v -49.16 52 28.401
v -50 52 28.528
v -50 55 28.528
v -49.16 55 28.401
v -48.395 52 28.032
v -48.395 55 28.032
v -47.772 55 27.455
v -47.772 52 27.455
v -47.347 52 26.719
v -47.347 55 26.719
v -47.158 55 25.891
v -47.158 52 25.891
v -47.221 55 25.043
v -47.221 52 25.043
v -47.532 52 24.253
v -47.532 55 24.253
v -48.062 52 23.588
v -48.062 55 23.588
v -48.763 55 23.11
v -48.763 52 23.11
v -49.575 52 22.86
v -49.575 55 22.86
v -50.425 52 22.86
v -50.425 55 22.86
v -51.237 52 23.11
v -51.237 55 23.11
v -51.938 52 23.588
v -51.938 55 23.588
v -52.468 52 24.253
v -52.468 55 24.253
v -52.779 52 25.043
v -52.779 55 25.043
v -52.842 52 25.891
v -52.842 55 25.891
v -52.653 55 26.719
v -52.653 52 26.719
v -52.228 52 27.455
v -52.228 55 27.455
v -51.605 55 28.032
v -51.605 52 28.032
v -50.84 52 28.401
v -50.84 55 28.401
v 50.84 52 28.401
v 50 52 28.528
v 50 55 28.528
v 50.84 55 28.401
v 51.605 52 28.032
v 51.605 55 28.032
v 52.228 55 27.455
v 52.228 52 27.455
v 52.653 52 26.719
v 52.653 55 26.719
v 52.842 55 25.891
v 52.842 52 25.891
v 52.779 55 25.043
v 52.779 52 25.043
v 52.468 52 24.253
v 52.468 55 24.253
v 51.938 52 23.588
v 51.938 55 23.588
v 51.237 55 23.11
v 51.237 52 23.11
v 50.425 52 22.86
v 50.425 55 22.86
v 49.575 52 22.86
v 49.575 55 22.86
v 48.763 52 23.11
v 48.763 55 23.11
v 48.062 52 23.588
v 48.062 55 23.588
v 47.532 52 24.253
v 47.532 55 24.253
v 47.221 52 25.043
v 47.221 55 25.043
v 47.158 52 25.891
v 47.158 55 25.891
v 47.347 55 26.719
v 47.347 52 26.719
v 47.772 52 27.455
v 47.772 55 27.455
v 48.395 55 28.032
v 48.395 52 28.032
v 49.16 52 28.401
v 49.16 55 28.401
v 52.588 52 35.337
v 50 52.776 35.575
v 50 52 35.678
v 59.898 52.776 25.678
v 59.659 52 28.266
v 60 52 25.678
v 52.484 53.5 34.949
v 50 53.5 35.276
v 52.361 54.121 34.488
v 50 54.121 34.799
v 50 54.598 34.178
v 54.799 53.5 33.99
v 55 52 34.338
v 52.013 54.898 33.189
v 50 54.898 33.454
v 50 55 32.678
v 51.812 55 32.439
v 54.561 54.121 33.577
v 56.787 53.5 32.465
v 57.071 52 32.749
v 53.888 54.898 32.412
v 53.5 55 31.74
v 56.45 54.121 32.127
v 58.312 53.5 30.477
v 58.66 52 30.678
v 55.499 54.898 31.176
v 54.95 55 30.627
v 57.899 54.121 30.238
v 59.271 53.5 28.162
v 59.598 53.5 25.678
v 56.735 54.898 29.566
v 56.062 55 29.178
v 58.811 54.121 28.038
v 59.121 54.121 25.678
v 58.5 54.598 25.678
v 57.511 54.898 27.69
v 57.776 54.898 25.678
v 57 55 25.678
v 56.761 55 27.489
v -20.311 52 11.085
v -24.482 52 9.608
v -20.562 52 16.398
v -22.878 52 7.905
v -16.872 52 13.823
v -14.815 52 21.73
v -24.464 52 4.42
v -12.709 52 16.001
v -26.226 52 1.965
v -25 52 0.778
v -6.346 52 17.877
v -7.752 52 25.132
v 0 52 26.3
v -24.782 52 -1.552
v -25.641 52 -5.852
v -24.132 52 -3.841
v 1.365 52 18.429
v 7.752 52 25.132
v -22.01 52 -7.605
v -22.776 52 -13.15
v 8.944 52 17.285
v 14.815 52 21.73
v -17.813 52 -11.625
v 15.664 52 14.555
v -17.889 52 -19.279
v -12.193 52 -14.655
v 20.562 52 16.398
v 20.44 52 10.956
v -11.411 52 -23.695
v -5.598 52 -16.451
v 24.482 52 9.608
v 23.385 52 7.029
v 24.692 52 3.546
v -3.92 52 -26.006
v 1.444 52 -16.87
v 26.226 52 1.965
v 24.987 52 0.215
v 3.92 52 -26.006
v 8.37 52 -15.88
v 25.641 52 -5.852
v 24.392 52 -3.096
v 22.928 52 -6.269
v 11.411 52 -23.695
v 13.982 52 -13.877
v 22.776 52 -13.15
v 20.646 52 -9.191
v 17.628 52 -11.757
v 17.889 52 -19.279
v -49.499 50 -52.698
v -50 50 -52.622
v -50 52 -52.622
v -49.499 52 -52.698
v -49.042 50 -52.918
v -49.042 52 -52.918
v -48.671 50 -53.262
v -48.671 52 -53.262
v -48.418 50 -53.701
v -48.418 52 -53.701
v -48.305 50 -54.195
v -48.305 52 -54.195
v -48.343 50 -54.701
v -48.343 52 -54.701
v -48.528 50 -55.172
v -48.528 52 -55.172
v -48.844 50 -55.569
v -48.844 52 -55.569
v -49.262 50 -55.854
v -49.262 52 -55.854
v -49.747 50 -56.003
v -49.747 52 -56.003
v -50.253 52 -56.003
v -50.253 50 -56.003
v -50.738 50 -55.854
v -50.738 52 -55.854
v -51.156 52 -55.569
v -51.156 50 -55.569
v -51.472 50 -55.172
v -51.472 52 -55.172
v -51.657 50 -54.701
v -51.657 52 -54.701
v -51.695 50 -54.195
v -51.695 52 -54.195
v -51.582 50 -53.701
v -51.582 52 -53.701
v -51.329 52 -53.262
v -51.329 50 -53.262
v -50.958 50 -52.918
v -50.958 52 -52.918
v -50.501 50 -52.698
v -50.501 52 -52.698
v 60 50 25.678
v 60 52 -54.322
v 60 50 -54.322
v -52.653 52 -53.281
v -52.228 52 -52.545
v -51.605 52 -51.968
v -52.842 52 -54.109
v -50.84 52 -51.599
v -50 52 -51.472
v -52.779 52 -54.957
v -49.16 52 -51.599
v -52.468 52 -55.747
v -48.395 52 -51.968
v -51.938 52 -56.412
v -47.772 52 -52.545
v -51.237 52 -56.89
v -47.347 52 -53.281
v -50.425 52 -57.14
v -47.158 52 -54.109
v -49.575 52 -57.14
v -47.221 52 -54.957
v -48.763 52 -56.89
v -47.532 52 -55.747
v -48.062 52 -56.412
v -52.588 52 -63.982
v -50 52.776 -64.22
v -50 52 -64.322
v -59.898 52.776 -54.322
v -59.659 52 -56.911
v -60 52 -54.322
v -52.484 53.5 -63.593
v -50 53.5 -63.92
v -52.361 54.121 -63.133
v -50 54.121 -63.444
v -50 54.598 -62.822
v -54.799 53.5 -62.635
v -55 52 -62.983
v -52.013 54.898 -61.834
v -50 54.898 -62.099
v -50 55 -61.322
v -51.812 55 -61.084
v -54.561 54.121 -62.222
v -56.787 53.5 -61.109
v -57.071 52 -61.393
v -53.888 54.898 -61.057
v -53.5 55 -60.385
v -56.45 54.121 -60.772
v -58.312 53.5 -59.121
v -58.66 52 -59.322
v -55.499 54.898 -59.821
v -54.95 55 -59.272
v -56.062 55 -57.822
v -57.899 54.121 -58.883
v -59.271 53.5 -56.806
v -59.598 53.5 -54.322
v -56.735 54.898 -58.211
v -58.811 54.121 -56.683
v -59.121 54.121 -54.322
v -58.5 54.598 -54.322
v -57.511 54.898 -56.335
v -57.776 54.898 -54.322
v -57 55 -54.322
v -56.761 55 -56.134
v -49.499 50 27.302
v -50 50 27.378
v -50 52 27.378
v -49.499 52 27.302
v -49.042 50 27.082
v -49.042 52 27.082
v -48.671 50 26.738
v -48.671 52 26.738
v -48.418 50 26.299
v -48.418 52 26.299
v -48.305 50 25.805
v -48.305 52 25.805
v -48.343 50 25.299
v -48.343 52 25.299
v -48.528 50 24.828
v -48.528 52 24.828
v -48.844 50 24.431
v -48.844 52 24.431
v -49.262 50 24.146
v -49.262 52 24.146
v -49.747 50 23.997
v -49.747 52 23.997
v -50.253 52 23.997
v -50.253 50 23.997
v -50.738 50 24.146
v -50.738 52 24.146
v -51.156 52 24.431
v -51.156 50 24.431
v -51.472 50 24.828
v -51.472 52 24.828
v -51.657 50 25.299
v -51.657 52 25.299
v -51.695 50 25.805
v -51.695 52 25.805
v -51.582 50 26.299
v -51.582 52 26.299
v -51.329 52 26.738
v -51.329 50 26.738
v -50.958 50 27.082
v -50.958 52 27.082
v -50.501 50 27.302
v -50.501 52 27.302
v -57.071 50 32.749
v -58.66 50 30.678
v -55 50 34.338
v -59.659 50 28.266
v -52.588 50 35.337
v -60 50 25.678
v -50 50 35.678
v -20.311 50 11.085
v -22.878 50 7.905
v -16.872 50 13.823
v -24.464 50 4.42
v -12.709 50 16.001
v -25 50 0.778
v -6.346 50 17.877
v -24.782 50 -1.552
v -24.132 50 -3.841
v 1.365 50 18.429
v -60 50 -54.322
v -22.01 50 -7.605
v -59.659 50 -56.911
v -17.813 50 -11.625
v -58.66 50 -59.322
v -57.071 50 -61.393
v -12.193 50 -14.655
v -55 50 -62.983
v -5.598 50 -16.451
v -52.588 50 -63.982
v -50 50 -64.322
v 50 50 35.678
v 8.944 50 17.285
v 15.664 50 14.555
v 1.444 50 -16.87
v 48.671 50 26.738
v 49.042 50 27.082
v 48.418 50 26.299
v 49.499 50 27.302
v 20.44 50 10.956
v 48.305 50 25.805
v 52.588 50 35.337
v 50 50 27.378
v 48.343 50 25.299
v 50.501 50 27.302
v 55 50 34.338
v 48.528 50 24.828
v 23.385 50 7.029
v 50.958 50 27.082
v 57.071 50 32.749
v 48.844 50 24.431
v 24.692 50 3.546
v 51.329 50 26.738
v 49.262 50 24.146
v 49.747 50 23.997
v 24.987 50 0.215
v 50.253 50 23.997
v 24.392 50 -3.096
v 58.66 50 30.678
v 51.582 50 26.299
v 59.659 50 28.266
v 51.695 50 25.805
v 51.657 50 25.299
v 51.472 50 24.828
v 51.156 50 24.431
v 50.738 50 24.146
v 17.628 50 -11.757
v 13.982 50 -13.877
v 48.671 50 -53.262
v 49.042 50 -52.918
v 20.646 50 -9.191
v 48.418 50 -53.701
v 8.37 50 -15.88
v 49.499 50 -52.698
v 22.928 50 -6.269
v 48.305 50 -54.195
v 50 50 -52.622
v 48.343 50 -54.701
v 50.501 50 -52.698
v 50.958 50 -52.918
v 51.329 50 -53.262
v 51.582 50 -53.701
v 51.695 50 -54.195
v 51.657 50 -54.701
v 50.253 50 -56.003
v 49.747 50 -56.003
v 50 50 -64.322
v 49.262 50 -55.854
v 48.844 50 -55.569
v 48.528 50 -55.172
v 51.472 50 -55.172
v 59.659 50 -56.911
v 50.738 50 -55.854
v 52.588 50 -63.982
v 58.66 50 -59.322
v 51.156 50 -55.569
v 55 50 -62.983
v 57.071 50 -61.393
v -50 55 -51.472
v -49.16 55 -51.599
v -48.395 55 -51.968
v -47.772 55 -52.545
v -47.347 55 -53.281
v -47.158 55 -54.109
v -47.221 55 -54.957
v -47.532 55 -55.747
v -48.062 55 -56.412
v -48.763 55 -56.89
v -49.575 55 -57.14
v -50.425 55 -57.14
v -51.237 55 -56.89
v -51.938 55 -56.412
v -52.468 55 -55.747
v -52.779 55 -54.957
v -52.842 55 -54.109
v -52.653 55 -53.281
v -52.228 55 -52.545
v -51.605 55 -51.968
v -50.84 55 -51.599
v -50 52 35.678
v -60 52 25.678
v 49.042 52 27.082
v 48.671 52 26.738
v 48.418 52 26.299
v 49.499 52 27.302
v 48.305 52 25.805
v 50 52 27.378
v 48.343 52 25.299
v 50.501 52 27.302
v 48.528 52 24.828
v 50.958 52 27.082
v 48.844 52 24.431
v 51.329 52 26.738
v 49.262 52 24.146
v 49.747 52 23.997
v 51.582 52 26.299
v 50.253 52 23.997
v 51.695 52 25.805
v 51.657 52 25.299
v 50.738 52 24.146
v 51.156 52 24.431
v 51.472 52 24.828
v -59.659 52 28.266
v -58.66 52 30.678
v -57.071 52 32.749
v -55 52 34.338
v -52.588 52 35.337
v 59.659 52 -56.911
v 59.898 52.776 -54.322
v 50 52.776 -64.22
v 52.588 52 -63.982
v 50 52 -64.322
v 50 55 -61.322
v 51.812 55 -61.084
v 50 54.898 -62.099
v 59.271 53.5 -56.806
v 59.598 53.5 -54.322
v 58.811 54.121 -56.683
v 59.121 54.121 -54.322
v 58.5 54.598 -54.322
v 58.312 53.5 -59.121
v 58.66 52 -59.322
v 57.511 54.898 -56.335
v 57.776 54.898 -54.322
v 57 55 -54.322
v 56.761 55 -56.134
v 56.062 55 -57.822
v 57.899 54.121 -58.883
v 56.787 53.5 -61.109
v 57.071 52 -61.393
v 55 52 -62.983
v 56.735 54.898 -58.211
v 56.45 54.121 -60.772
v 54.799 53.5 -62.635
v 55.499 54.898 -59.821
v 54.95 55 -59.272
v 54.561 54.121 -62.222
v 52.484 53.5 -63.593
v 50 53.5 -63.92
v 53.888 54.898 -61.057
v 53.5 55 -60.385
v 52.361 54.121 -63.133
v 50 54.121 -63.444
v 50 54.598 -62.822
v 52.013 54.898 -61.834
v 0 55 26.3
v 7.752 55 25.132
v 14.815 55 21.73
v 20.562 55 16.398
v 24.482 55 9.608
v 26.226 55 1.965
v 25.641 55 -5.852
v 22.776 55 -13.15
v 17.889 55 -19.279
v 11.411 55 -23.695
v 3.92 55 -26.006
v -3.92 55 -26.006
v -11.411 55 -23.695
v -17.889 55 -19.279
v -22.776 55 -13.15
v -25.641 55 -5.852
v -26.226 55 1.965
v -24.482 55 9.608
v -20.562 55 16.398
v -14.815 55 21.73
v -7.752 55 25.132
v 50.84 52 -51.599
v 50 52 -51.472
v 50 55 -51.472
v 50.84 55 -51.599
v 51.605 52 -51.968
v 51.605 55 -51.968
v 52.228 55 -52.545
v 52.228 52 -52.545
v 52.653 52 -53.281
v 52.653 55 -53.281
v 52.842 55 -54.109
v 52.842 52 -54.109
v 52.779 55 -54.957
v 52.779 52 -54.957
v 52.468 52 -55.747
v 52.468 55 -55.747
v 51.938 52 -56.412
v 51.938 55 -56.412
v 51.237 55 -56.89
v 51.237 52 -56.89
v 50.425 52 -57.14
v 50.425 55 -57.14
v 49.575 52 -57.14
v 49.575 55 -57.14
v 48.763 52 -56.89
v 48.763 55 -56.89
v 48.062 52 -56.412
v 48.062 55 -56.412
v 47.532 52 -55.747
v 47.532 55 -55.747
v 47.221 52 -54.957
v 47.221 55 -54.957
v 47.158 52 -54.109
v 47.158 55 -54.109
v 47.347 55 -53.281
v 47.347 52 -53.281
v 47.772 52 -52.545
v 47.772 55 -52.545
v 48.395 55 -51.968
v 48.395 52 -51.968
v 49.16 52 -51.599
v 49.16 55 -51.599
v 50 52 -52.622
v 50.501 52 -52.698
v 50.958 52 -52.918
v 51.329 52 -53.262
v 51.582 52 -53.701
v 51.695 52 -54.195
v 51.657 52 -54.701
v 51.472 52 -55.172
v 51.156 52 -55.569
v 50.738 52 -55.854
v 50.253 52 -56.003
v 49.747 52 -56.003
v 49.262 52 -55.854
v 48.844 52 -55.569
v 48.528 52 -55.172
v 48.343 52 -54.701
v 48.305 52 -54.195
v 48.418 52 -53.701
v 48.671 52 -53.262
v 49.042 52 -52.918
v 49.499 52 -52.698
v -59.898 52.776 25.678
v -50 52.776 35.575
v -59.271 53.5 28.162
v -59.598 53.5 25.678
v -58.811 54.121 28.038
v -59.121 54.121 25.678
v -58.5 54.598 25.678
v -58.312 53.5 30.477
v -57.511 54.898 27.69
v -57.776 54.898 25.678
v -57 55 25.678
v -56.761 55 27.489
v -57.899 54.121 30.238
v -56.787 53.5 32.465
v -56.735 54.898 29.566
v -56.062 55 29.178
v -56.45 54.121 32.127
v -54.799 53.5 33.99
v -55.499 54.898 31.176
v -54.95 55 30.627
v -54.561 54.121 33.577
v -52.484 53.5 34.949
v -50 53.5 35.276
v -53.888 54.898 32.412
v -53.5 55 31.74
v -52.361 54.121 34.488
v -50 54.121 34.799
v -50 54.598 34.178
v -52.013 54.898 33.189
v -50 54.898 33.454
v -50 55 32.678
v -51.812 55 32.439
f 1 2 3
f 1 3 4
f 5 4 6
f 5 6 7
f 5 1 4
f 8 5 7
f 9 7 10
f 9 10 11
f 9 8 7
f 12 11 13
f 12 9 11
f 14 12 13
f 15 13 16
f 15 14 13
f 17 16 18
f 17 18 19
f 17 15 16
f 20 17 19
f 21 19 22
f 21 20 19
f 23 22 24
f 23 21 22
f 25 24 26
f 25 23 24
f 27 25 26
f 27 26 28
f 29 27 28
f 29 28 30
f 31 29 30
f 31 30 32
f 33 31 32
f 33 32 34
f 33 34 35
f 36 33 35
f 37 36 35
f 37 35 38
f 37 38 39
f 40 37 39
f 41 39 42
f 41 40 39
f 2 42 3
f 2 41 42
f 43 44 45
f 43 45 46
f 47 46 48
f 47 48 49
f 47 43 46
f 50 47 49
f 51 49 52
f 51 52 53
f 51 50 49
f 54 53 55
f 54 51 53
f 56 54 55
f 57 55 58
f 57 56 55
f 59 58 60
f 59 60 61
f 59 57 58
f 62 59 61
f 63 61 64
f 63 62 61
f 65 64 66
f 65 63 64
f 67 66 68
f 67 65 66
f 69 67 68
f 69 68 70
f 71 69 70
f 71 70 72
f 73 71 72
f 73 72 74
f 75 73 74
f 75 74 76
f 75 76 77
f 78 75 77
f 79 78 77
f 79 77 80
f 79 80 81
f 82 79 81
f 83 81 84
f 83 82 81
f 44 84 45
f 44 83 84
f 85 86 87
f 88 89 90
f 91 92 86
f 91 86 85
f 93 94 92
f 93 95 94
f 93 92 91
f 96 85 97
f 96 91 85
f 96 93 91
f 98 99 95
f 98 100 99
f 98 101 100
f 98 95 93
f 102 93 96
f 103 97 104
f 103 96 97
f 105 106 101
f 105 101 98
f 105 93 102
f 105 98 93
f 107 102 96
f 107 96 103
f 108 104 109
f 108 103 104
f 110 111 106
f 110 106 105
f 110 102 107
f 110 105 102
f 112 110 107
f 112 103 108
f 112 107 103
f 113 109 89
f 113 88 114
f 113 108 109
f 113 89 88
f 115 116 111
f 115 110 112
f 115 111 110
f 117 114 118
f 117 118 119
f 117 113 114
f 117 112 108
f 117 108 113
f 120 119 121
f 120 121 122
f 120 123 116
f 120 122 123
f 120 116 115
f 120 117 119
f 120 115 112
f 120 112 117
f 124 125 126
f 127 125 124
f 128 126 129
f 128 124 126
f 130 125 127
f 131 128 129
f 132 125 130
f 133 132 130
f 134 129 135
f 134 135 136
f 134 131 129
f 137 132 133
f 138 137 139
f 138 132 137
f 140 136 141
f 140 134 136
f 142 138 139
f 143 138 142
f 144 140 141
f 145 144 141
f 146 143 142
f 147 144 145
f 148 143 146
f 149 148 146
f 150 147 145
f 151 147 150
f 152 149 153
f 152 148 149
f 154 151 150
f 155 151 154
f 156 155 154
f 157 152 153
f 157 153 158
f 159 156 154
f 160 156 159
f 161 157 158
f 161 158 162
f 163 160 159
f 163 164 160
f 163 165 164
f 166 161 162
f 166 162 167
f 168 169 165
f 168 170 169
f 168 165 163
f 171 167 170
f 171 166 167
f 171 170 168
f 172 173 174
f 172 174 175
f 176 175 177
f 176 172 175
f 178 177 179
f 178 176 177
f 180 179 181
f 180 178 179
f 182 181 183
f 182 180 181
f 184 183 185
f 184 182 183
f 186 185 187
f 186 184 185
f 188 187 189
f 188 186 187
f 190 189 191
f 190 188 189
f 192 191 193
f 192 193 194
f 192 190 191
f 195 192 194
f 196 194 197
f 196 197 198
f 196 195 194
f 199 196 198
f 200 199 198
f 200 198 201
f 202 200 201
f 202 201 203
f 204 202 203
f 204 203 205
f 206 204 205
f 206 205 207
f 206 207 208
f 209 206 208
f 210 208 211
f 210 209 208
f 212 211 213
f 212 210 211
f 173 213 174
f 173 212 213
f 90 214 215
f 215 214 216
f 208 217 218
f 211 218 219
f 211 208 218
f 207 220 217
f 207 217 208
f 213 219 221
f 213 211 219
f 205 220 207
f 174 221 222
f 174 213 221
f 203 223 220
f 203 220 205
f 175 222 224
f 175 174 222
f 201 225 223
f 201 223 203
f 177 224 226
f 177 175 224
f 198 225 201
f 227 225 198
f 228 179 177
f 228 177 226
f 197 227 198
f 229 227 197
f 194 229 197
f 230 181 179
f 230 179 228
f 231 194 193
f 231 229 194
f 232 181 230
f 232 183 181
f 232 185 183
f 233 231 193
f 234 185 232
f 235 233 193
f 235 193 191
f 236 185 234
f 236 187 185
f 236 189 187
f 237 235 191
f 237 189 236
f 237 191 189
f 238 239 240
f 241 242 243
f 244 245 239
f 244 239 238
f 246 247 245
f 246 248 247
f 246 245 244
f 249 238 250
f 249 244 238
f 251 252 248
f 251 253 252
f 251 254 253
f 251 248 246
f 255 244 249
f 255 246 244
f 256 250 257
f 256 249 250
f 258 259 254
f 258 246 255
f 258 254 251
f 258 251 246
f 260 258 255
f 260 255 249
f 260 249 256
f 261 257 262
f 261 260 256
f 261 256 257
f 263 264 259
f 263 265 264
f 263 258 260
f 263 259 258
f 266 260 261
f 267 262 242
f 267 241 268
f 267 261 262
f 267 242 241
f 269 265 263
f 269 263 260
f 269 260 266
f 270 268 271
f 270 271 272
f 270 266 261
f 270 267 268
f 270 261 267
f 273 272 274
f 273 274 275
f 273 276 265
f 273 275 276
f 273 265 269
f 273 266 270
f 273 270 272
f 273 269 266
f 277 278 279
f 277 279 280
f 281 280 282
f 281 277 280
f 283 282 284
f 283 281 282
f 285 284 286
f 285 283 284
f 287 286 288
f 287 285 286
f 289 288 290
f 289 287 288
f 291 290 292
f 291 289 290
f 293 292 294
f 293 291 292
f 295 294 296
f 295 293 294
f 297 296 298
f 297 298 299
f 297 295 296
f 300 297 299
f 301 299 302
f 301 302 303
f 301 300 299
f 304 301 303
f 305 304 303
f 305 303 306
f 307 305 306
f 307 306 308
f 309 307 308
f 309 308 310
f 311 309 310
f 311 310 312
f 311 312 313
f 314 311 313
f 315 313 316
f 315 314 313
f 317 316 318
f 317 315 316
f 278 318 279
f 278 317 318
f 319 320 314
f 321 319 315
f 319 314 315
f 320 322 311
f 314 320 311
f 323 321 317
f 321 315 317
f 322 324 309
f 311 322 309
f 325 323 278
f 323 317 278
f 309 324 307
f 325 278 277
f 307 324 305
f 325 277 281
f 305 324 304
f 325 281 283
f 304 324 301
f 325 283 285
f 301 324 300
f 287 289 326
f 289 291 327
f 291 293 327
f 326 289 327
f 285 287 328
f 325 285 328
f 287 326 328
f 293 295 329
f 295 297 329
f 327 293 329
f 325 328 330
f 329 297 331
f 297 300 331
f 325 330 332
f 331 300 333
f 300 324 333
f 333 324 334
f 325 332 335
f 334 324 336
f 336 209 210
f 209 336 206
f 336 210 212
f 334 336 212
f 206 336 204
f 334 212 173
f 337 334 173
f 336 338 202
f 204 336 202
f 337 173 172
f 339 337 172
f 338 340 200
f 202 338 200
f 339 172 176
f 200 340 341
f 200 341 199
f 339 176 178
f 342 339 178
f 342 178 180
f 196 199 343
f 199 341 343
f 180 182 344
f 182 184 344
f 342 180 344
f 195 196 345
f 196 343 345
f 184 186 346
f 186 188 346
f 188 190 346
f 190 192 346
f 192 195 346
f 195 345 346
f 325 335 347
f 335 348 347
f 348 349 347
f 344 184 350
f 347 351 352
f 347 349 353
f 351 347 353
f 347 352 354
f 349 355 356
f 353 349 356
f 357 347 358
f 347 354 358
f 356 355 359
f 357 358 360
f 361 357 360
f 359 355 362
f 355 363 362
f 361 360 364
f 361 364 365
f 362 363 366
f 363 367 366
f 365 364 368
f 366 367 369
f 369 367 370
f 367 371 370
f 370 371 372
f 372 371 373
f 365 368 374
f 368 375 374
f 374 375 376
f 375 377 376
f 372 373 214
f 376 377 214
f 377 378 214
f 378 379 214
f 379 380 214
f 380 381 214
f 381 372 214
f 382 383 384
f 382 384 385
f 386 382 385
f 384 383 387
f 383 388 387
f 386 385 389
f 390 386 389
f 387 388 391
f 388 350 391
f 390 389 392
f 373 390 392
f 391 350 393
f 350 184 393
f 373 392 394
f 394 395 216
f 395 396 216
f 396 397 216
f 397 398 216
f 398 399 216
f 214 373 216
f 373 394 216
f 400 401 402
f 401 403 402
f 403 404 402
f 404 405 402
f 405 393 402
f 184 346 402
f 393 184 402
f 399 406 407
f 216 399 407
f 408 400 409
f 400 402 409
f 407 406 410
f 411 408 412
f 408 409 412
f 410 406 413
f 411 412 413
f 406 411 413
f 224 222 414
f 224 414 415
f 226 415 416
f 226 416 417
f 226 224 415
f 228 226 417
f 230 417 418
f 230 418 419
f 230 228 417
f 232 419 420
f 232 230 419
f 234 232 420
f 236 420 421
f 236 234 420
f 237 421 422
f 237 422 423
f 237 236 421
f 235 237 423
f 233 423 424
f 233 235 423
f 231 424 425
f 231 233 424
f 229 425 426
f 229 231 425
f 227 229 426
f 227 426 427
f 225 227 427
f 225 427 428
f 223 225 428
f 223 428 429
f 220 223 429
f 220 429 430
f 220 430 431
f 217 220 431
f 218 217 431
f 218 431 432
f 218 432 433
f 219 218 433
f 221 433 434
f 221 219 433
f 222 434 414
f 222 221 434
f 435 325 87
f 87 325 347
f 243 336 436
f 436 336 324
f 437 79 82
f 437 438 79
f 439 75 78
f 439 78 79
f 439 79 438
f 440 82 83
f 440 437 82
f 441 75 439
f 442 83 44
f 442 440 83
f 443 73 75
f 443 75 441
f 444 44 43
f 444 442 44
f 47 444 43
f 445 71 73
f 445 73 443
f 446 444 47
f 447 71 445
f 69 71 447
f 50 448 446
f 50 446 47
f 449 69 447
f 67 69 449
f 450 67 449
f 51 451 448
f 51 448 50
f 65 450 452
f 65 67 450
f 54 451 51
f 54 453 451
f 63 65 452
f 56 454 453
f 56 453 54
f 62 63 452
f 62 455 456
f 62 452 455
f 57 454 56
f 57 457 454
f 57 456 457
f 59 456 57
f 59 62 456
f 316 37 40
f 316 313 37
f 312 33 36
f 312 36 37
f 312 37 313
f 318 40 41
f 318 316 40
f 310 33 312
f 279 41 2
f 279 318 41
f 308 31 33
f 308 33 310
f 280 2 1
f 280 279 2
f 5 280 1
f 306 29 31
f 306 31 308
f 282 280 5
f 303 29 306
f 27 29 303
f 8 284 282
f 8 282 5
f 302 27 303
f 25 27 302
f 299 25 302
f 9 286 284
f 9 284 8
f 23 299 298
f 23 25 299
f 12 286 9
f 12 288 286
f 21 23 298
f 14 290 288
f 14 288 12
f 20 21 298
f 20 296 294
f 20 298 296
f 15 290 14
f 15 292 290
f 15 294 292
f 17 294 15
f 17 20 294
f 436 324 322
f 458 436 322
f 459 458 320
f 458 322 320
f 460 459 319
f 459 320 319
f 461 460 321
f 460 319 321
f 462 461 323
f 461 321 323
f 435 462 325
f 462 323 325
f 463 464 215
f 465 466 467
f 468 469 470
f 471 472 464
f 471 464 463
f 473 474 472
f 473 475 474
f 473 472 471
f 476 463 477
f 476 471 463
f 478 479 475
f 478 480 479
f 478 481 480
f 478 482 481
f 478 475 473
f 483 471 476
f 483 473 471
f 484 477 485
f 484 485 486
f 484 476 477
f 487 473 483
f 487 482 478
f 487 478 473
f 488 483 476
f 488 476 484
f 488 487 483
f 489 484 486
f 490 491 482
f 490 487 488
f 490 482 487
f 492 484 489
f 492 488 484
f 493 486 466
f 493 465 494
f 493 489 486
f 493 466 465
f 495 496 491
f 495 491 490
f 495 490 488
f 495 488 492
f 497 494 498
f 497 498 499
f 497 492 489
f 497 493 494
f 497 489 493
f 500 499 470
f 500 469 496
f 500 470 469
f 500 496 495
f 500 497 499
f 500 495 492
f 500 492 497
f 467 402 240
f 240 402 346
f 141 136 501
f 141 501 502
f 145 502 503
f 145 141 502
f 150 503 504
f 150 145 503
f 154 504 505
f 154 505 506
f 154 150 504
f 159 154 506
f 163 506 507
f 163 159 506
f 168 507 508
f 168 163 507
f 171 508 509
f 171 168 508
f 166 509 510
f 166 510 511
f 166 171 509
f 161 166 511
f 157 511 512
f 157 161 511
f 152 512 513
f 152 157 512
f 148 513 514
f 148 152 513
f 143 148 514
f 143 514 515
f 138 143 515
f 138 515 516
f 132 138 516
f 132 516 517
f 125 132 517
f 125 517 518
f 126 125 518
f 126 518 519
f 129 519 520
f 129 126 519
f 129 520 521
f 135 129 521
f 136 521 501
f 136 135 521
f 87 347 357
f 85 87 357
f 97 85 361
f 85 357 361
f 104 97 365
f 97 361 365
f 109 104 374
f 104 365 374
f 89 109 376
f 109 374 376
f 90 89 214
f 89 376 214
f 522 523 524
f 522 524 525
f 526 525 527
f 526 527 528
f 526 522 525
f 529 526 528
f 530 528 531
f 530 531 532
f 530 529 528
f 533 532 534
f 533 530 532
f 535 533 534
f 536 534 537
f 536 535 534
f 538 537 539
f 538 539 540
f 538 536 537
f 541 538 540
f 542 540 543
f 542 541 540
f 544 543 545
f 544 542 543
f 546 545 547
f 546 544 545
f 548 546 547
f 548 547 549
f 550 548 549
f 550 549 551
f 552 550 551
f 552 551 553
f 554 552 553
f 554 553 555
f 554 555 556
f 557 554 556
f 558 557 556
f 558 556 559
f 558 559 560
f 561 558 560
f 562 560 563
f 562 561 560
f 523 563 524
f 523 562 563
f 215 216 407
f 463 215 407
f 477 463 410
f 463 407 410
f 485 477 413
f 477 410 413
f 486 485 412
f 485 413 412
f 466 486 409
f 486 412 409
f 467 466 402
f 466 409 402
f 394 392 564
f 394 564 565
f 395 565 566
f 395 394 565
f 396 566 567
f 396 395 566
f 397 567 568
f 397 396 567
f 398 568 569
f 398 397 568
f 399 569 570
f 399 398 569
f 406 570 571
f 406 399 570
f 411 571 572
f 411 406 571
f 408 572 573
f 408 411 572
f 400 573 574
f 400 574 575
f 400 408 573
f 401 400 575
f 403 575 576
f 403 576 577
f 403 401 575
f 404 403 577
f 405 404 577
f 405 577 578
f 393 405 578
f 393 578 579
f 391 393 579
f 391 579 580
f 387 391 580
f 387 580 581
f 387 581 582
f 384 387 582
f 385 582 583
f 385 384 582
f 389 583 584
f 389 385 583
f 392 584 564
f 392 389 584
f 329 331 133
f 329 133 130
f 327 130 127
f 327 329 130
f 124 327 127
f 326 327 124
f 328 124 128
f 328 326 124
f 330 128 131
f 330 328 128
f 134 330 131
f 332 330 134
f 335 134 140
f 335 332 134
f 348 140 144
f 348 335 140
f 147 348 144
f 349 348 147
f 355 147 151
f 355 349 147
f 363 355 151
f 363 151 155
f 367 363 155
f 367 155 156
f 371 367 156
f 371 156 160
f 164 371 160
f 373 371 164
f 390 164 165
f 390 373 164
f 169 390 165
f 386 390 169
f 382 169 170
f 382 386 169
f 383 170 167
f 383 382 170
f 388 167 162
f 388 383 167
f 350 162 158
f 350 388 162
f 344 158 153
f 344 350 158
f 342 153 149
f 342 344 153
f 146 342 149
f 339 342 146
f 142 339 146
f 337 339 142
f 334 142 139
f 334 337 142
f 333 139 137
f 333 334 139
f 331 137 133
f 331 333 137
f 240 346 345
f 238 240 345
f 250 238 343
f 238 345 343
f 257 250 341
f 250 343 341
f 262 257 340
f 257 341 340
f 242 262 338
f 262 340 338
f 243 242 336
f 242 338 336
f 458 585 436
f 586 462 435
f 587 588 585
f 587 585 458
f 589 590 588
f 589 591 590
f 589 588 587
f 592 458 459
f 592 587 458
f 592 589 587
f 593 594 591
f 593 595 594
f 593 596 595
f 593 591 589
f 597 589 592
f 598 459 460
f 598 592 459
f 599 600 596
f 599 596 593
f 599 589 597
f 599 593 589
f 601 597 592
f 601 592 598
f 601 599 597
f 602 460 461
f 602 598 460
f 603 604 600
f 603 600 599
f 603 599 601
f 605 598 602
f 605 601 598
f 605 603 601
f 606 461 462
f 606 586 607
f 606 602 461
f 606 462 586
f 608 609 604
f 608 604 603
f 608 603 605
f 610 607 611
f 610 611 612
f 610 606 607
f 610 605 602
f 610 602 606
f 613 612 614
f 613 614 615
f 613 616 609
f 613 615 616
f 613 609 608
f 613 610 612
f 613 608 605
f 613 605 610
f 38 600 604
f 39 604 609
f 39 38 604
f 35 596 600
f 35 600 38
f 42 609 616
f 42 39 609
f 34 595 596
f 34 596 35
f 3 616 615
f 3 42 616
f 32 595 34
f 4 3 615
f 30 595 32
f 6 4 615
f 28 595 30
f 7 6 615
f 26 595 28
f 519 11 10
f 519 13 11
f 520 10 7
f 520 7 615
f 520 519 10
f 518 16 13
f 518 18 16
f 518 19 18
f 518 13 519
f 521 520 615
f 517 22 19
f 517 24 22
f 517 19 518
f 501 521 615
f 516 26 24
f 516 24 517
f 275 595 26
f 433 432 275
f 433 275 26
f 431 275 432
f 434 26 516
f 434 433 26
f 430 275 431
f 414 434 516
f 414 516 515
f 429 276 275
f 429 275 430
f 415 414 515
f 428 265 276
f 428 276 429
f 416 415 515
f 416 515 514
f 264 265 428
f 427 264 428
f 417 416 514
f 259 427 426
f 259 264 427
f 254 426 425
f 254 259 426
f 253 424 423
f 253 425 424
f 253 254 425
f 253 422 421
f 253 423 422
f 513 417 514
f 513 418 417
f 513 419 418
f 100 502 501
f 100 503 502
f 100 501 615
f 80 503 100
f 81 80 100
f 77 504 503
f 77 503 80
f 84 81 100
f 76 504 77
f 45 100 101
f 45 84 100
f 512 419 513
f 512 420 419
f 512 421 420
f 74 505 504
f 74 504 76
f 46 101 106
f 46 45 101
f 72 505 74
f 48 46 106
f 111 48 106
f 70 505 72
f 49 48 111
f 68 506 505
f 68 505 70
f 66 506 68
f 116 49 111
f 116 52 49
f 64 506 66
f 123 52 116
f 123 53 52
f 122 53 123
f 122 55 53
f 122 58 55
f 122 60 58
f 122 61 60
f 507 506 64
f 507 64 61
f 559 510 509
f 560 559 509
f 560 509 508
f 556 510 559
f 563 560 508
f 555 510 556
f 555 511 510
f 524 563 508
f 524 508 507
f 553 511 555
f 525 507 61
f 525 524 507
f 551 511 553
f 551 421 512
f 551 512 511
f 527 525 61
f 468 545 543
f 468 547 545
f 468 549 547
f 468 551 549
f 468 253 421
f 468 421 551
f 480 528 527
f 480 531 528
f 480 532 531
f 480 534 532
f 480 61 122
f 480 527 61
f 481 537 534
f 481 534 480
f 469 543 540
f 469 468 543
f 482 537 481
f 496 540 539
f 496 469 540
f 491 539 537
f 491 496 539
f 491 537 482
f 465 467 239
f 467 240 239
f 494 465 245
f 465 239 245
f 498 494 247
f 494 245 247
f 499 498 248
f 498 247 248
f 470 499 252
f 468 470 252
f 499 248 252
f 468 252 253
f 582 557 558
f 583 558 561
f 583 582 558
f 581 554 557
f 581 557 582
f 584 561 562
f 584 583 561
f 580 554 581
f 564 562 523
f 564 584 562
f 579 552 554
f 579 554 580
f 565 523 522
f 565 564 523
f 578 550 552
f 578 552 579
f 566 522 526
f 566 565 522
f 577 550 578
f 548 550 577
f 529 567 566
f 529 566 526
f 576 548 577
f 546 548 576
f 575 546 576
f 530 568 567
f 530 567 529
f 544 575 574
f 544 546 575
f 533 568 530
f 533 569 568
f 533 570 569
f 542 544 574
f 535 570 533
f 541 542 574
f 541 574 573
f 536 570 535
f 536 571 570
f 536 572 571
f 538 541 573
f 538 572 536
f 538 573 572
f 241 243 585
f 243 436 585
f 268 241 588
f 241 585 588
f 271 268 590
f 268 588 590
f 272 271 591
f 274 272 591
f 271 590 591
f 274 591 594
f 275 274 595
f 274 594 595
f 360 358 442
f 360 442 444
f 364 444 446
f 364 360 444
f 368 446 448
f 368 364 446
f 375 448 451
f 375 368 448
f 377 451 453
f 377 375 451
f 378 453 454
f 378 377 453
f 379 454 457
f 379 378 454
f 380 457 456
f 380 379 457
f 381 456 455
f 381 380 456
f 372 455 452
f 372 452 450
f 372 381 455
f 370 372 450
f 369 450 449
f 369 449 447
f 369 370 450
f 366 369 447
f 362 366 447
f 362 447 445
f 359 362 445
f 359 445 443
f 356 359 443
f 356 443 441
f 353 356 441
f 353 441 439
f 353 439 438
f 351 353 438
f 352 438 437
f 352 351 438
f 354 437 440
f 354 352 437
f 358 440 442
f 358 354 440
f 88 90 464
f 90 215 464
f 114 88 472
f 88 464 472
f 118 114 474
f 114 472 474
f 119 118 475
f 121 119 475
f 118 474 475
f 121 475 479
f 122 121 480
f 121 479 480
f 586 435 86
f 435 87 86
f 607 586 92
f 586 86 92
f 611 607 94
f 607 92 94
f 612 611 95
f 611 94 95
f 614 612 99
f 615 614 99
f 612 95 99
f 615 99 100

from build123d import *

# Parameters (mm, degrees)
SKETCH1_R           = 1.7
SKETCH1_RX          = 25
SKETCH1_RY          = 17.67766953
BOSS_EXTRUDE1_DEPTH = 2
BOSS_EXTRUDE2_START = 2
SKETCH1_3_R         = 2.85
SKETCH1_3_R_2       = 26.3
BOSS_EXTRUDE2_DEPTH = 3
FILLET1_R           = 3


with BuildPart() as part:
    # Sketch1 → Boss-Extrude1 (new body)
    with BuildSketch(Plane(origin=(0, 50, 0), x_dir=(1, 0, 0), z_dir=(0, 1, 0))):
        with BuildLine():
            Line((-50, -35.67766953), (50, -35.67766953))
            ThreePointArc((50, -35.67766953), (57.071067812, -32.748737342), (60, -25.67766953))
            Line((60, -25.67766953), (60, 54.32233047))
            ThreePointArc((60, 54.32233047), (57.071067812, 61.393398282), (50, 64.32233047))
            Line((50, 64.32233047), (-50, 64.32233047))
            ThreePointArc((-50, 64.32233047), (-57.071067812, 61.393398282), (-60, 54.32233047))
            Line((-60, 54.32233047), (-60, -25.67766953))
            ThreePointArc((-60, -25.67766953), (-57.071067812, -32.748737342), (-50, -35.67766953))
        make_face()
        with Locations(Location((-50, -25.67766953, 0), (0, 0, 270))):
            Circle(SKETCH1_R, mode=Mode.SUBTRACT)
        with Locations(Location((50, -25.67766953, 0), (0, 0, 270))):
            Circle(SKETCH1_R, mode=Mode.SUBTRACT)
        with Locations(Location((50, 54.32233047, 0), (0, 0, 270))):
            Circle(SKETCH1_R, mode=Mode.SUBTRACT)
        with Locations(Location((-50, 54.32233047, 0), (0, 0, 270))):
            Circle(SKETCH1_R, mode=Mode.SUBTRACT)
        with Locations(Location((0, -0.777817459), (0, 0, -180))):
            Ellipse(SKETCH1_RX, SKETCH1_RY, mode=Mode.SUBTRACT)
    extrude(amount=BOSS_EXTRUDE1_DEPTH)

    # Sketch1<3> → Boss-Extrude2 (add)
    with BuildSketch(Plane(origin=(0, 50, 0), x_dir=(1, 0, 0), z_dir=(0, 1, 0)).offset(BOSS_EXTRUDE2_START)):
        with BuildLine():
            Line((-50, -35.67766953), (50, -35.67766953))
            ThreePointArc((50, -35.67766953), (57.071067812, -32.748737342), (60, -25.67766953))
            Line((60, -25.67766953), (60, 54.32233047))
            ThreePointArc((60, 54.32233047), (57.071067812, 61.393398282), (50, 64.32233047))
            Line((50, 64.32233047), (-50, 64.32233047))
            ThreePointArc((-50, 64.32233047), (-57.071067812, 61.393398282), (-60, 54.32233047))
            Line((-60, 54.32233047), (-60, -25.67766953))
            ThreePointArc((-60, -25.67766953), (-57.071067812, -32.748737342), (-50, -35.67766953))
        make_face()
        with Locations(Location((-50, 54.32233047, 0), (0, 0, 270))):
            Circle(SKETCH1_3_R, mode=Mode.SUBTRACT)
        with Locations(Location((-50, -25.67766953, 0), (0, 0, 270))):
            Circle(SKETCH1_3_R, mode=Mode.SUBTRACT)
        with Locations(Location((50, 54.32233047, 0), (0, 0, 270))):
            Circle(SKETCH1_3_R, mode=Mode.SUBTRACT)
        with Locations(Location((50, -25.67766953, 0), (0, 0, 270))):
            Circle(SKETCH1_3_R, mode=Mode.SUBTRACT)
        with Locations(Location((0, 0, 0), (0, 0, 270))):
            Circle(SKETCH1_3_R_2, mode=Mode.SUBTRACT)
    extrude(amount=BOSS_EXTRUDE2_DEPTH)

    # Fillet1
    fillet1_edges = [part.edges().sort_by_distance(p)[0] for p in [
        (57.071067812, 55, 32.748737342),
        (57.071067812, 55, -61.393398282),
        (-57.071067812, 55, -61.393398282),
        (-57.071067812, 55, 32.748737342),
        (60, 55, -14.32233047),
        (0, 55, -64.32233047),
        (-60, 55, -14.32233047),
        (0, 55, 35.67766953),
    ]]
    fillet(fillet1_edges, radius=FILLET1_R)


solid = part.part
